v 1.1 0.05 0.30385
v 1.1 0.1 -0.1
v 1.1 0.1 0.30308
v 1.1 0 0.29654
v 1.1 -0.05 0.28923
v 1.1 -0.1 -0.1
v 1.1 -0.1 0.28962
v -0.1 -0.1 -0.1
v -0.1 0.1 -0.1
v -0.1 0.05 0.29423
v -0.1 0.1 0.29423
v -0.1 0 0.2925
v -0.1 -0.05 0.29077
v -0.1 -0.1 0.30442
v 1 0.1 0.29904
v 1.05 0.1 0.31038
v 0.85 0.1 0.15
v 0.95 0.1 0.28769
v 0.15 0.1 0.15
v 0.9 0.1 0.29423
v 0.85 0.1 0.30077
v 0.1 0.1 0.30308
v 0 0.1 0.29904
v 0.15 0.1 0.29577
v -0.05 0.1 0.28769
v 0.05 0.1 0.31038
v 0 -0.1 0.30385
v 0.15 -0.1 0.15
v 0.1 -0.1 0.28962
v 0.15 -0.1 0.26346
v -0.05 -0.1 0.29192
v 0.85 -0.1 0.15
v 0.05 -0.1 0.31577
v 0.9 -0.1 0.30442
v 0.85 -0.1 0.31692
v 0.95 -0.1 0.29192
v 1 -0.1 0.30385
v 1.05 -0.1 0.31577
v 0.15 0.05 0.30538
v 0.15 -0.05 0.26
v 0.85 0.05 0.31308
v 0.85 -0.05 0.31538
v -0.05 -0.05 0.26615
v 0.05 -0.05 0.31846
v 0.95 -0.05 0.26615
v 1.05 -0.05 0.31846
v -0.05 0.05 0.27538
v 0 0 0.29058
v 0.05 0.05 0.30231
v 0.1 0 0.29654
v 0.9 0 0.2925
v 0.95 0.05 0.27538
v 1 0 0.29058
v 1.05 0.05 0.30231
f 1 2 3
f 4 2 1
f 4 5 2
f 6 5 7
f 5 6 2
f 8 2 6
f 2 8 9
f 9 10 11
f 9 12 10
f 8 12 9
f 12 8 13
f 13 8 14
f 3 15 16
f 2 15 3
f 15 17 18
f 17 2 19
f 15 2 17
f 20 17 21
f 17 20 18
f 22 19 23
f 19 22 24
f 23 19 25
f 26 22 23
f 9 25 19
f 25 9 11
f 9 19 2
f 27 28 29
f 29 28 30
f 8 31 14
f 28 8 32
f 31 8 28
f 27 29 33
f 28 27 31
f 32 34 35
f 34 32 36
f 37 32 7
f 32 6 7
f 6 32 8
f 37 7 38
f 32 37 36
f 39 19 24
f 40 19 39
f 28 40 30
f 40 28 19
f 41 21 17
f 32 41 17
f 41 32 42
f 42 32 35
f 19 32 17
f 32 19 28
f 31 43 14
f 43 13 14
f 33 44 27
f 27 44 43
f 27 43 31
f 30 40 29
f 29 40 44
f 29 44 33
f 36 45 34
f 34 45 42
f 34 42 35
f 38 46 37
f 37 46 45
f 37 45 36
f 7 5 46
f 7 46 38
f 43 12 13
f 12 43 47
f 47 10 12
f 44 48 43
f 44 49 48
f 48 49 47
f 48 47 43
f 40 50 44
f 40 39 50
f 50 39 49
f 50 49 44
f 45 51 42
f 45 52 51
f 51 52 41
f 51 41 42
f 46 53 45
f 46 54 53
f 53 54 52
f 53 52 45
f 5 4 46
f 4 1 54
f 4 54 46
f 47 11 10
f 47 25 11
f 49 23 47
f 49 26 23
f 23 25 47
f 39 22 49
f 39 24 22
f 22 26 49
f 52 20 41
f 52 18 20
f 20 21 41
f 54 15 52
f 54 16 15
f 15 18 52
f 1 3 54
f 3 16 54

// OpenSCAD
intersection() {
    color([0.3, 0.3, 0.5])
    difference() {
        translate([-0.1,-0.1,-0.1])
        cube([1.2, .2, 1.2], false);

        rotate([90, 0, 0])
        {
            translate([.5, .5, 0])
            cube([.7, .7, .3], center = true);
        }

    }
    color([0.5, 0.5, 0.5])
    translate([-.15,-.15,.25])
    scale([1/10,1/10, 1/13])
    union() {
        surface("jagged.dat");
        translate([0,0,-13])
        cube([13,13,13]);
    }
}
